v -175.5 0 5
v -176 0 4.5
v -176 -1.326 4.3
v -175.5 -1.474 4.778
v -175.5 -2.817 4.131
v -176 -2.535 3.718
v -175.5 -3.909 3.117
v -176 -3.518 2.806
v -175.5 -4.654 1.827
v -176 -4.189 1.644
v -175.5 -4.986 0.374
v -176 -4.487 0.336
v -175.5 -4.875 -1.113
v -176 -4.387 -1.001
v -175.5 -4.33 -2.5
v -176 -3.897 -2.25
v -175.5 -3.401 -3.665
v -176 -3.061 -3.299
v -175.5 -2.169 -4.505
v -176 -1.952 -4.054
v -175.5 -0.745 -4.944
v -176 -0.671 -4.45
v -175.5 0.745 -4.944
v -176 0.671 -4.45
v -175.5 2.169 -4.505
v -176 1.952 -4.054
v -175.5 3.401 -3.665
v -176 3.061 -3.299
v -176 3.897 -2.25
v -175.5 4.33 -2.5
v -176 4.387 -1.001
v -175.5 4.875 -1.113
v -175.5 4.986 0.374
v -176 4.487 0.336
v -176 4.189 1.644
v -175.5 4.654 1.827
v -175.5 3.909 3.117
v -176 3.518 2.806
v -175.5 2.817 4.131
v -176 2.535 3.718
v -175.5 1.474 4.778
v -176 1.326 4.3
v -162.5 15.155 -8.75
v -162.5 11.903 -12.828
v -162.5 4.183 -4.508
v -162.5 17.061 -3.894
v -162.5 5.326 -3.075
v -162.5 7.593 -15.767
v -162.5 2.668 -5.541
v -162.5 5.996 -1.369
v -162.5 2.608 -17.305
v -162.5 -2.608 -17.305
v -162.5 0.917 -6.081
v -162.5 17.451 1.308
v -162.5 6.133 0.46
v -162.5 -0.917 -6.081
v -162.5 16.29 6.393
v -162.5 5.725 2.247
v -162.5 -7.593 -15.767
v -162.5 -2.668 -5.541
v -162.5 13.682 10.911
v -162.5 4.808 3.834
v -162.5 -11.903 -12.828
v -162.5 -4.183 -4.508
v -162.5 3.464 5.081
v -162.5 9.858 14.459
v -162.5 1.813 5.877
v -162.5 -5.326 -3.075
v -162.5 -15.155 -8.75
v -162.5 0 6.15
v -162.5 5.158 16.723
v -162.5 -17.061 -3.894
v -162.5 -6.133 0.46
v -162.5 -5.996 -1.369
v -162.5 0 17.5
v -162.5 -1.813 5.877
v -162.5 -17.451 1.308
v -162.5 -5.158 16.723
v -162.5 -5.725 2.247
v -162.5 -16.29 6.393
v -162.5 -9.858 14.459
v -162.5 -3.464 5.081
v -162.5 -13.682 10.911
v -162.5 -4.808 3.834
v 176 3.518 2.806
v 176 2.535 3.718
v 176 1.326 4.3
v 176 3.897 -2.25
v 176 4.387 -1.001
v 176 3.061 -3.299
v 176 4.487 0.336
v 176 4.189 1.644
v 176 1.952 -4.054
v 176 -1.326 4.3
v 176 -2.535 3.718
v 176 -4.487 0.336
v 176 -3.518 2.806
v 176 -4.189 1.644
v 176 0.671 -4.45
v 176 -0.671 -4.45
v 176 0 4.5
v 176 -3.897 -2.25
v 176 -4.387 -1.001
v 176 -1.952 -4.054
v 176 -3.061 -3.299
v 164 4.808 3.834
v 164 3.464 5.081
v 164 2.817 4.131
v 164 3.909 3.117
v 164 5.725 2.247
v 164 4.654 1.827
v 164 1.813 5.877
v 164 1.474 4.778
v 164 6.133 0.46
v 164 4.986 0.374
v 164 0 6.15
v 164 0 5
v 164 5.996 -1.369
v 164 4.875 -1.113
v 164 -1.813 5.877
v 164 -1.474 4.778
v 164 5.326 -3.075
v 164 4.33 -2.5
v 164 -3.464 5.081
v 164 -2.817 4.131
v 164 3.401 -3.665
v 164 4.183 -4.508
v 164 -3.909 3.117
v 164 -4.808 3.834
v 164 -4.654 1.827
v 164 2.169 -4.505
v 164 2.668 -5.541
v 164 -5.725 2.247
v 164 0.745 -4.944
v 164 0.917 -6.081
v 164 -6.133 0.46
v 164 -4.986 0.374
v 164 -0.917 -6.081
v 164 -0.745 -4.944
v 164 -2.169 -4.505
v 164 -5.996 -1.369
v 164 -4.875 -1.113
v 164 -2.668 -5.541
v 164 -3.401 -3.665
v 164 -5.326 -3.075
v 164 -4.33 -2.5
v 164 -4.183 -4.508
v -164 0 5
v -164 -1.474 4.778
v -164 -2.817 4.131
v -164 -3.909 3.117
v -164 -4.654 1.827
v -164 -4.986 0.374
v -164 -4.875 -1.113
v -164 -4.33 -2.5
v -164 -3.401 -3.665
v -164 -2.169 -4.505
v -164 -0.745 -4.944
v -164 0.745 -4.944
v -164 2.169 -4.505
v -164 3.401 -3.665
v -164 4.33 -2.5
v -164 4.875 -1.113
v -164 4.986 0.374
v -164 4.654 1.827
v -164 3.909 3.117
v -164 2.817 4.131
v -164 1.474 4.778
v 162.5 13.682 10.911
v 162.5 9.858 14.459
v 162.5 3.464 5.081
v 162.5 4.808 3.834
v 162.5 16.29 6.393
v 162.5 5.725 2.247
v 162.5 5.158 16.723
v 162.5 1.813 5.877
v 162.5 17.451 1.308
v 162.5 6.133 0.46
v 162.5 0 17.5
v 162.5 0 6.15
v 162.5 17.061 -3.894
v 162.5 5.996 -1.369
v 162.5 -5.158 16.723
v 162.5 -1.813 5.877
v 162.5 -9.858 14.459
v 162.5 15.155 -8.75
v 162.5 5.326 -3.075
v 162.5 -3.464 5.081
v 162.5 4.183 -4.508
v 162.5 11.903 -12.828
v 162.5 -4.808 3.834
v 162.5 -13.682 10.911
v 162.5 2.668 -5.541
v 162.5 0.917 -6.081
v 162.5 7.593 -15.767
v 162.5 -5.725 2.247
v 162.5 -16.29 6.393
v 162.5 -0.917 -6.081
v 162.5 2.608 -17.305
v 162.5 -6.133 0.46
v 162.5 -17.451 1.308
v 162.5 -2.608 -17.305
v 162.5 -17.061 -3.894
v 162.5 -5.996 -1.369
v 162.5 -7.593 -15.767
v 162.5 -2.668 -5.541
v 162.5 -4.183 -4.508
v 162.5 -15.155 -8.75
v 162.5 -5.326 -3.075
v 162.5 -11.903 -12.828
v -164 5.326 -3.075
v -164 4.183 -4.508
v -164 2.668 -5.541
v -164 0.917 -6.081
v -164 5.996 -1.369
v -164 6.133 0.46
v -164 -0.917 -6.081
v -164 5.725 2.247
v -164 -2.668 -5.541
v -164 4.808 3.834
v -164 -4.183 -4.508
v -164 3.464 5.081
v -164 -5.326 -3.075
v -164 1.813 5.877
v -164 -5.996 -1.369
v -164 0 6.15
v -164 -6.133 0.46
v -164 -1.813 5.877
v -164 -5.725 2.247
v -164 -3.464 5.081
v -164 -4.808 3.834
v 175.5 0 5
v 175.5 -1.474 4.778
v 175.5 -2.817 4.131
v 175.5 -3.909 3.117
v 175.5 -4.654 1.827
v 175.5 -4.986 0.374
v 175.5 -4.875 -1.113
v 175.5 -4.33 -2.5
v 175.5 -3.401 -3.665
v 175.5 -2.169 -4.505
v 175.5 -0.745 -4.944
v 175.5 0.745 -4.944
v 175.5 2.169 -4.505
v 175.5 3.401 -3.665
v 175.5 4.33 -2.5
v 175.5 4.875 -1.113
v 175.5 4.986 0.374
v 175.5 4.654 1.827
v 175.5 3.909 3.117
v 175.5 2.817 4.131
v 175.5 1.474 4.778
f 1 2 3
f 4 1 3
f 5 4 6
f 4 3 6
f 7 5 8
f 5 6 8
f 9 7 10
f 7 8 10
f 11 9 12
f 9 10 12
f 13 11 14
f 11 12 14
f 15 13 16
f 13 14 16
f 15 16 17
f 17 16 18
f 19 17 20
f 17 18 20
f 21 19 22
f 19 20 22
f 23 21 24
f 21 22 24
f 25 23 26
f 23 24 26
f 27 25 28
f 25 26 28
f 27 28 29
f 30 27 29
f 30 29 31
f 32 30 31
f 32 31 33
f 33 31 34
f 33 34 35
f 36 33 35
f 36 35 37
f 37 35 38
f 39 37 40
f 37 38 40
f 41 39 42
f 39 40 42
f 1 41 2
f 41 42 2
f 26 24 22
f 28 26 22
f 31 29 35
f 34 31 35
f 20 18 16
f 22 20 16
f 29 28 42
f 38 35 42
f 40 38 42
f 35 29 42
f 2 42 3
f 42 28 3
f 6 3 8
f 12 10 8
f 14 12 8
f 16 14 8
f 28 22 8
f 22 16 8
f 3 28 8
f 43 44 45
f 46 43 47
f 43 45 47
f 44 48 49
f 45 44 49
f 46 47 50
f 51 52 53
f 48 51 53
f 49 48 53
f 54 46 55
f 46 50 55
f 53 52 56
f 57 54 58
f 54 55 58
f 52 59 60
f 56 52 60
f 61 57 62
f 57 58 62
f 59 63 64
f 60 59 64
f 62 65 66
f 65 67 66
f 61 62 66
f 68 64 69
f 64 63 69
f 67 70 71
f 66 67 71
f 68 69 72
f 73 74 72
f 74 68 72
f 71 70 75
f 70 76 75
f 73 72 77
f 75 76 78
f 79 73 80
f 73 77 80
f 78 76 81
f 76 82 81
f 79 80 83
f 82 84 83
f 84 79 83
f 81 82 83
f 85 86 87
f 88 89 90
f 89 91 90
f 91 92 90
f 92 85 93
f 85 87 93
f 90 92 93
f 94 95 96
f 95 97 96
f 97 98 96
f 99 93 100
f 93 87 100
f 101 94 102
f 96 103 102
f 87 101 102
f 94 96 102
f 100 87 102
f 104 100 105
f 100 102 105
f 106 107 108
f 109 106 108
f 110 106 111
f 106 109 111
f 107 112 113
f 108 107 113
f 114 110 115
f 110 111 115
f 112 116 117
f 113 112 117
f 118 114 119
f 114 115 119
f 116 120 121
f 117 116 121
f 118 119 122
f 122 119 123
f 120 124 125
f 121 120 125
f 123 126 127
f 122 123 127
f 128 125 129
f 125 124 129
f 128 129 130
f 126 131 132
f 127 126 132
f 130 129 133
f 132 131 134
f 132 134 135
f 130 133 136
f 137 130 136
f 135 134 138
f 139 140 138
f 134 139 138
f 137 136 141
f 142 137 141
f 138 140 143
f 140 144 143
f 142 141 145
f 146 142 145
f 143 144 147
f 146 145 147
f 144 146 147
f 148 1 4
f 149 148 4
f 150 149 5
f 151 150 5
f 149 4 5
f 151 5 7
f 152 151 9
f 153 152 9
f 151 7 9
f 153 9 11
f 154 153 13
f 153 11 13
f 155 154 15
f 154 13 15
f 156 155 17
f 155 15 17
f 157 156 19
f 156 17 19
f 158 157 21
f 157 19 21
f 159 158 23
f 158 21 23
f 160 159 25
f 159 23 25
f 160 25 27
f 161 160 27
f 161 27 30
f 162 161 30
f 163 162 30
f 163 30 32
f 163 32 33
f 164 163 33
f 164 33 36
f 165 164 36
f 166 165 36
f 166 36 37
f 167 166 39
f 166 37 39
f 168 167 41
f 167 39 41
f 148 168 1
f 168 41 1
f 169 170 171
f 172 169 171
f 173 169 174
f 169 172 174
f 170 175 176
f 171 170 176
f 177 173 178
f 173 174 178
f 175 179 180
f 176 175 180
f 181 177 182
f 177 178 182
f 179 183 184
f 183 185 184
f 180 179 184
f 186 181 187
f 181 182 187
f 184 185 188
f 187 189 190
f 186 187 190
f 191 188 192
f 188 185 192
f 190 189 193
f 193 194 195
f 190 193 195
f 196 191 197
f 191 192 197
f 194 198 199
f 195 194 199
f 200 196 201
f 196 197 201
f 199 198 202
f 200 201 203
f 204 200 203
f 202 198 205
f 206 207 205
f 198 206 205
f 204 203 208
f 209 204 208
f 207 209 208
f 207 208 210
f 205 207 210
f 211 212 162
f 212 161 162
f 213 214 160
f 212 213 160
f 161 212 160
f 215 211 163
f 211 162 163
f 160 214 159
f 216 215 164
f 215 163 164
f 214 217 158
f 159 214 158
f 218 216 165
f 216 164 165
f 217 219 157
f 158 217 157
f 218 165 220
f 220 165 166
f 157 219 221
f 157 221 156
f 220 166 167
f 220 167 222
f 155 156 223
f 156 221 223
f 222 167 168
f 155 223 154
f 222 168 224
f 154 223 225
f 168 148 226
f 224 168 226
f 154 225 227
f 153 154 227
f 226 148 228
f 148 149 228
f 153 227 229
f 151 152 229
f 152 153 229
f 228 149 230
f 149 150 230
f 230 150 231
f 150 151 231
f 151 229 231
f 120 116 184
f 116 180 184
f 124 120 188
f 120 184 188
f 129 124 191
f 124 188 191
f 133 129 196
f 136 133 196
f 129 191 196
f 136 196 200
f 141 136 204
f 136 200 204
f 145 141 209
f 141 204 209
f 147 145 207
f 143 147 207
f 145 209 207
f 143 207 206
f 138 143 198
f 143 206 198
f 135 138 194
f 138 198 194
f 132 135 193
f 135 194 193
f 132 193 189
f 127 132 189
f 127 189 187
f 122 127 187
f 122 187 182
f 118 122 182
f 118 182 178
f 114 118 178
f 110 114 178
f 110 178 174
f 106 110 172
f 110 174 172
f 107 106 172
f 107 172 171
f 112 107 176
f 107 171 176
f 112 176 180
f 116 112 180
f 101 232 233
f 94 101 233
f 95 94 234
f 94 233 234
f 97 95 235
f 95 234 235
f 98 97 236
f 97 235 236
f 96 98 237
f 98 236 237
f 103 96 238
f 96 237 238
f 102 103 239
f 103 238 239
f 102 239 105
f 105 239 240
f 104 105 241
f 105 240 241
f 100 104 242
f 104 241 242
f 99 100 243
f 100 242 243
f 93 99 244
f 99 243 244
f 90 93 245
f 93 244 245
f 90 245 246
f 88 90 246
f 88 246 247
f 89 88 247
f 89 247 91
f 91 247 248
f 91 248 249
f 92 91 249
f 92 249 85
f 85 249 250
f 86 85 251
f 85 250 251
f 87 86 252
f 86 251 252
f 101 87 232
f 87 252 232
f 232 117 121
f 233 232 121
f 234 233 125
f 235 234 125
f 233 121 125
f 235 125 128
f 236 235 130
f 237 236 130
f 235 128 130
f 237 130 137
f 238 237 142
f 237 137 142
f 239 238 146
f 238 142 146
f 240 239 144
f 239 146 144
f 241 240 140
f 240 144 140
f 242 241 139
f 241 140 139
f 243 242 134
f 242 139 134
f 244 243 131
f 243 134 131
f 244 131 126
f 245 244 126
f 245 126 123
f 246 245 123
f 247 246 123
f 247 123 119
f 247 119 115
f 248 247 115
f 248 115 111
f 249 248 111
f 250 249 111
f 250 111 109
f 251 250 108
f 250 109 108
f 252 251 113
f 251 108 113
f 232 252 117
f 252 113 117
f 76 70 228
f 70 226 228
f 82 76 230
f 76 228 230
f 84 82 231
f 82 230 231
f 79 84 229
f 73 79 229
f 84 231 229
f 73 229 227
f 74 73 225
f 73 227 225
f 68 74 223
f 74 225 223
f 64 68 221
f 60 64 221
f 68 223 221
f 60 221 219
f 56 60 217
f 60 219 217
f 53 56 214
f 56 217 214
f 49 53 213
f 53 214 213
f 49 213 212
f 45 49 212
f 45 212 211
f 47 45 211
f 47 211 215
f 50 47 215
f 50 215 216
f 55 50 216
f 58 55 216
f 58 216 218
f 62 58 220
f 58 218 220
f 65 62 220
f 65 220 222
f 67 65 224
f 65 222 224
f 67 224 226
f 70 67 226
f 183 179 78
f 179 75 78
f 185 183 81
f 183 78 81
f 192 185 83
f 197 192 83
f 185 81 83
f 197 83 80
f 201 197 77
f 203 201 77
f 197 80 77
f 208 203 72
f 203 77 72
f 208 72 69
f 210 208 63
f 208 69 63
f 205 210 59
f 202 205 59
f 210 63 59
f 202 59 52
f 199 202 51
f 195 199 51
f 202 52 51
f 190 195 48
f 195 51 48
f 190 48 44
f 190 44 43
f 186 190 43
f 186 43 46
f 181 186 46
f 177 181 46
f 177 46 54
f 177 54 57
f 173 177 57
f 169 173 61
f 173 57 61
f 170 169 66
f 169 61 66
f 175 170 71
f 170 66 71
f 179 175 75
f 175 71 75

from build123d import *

# Parameters (mm, degrees)
CHAMFER_1_SIZE = 0.5


with BuildPart() as part:
    # 草图1 → 旋转1 (revolve)
    with BuildSketch(Plane(origin=(0, 0, 0), x_dir=(1, 0, 0), z_dir=(0, 1, 0)), mode=Mode.PRIVATE) as revolve_1_sk:
        Polygon((-176, 0), (176, 0), (176, 5), (164, 5), (164, 6.15), (162.5, 6.15), (162.5, 17.5), (-162.5, 17.5), (-162.5, 6.15), (-164, 6.15), (-164, 5), (-176, 5), align=None)
    revolve(revolve_1_sk.sketch.rotate(Axis((-176, 0, 0), (1, 0, 0)), 180), axis=Axis((-176, 0, 0), (1, 0, 0)))

    # 倒角1
    chamfer_1_edges = [part.edges().sort_by_distance(p)[0] for p in [
        (176, 0, -5),
        (-176, 0, -5),
    ]]
    chamfer(chamfer_1_edges, length=CHAMFER_1_SIZE)


solid = part.part
